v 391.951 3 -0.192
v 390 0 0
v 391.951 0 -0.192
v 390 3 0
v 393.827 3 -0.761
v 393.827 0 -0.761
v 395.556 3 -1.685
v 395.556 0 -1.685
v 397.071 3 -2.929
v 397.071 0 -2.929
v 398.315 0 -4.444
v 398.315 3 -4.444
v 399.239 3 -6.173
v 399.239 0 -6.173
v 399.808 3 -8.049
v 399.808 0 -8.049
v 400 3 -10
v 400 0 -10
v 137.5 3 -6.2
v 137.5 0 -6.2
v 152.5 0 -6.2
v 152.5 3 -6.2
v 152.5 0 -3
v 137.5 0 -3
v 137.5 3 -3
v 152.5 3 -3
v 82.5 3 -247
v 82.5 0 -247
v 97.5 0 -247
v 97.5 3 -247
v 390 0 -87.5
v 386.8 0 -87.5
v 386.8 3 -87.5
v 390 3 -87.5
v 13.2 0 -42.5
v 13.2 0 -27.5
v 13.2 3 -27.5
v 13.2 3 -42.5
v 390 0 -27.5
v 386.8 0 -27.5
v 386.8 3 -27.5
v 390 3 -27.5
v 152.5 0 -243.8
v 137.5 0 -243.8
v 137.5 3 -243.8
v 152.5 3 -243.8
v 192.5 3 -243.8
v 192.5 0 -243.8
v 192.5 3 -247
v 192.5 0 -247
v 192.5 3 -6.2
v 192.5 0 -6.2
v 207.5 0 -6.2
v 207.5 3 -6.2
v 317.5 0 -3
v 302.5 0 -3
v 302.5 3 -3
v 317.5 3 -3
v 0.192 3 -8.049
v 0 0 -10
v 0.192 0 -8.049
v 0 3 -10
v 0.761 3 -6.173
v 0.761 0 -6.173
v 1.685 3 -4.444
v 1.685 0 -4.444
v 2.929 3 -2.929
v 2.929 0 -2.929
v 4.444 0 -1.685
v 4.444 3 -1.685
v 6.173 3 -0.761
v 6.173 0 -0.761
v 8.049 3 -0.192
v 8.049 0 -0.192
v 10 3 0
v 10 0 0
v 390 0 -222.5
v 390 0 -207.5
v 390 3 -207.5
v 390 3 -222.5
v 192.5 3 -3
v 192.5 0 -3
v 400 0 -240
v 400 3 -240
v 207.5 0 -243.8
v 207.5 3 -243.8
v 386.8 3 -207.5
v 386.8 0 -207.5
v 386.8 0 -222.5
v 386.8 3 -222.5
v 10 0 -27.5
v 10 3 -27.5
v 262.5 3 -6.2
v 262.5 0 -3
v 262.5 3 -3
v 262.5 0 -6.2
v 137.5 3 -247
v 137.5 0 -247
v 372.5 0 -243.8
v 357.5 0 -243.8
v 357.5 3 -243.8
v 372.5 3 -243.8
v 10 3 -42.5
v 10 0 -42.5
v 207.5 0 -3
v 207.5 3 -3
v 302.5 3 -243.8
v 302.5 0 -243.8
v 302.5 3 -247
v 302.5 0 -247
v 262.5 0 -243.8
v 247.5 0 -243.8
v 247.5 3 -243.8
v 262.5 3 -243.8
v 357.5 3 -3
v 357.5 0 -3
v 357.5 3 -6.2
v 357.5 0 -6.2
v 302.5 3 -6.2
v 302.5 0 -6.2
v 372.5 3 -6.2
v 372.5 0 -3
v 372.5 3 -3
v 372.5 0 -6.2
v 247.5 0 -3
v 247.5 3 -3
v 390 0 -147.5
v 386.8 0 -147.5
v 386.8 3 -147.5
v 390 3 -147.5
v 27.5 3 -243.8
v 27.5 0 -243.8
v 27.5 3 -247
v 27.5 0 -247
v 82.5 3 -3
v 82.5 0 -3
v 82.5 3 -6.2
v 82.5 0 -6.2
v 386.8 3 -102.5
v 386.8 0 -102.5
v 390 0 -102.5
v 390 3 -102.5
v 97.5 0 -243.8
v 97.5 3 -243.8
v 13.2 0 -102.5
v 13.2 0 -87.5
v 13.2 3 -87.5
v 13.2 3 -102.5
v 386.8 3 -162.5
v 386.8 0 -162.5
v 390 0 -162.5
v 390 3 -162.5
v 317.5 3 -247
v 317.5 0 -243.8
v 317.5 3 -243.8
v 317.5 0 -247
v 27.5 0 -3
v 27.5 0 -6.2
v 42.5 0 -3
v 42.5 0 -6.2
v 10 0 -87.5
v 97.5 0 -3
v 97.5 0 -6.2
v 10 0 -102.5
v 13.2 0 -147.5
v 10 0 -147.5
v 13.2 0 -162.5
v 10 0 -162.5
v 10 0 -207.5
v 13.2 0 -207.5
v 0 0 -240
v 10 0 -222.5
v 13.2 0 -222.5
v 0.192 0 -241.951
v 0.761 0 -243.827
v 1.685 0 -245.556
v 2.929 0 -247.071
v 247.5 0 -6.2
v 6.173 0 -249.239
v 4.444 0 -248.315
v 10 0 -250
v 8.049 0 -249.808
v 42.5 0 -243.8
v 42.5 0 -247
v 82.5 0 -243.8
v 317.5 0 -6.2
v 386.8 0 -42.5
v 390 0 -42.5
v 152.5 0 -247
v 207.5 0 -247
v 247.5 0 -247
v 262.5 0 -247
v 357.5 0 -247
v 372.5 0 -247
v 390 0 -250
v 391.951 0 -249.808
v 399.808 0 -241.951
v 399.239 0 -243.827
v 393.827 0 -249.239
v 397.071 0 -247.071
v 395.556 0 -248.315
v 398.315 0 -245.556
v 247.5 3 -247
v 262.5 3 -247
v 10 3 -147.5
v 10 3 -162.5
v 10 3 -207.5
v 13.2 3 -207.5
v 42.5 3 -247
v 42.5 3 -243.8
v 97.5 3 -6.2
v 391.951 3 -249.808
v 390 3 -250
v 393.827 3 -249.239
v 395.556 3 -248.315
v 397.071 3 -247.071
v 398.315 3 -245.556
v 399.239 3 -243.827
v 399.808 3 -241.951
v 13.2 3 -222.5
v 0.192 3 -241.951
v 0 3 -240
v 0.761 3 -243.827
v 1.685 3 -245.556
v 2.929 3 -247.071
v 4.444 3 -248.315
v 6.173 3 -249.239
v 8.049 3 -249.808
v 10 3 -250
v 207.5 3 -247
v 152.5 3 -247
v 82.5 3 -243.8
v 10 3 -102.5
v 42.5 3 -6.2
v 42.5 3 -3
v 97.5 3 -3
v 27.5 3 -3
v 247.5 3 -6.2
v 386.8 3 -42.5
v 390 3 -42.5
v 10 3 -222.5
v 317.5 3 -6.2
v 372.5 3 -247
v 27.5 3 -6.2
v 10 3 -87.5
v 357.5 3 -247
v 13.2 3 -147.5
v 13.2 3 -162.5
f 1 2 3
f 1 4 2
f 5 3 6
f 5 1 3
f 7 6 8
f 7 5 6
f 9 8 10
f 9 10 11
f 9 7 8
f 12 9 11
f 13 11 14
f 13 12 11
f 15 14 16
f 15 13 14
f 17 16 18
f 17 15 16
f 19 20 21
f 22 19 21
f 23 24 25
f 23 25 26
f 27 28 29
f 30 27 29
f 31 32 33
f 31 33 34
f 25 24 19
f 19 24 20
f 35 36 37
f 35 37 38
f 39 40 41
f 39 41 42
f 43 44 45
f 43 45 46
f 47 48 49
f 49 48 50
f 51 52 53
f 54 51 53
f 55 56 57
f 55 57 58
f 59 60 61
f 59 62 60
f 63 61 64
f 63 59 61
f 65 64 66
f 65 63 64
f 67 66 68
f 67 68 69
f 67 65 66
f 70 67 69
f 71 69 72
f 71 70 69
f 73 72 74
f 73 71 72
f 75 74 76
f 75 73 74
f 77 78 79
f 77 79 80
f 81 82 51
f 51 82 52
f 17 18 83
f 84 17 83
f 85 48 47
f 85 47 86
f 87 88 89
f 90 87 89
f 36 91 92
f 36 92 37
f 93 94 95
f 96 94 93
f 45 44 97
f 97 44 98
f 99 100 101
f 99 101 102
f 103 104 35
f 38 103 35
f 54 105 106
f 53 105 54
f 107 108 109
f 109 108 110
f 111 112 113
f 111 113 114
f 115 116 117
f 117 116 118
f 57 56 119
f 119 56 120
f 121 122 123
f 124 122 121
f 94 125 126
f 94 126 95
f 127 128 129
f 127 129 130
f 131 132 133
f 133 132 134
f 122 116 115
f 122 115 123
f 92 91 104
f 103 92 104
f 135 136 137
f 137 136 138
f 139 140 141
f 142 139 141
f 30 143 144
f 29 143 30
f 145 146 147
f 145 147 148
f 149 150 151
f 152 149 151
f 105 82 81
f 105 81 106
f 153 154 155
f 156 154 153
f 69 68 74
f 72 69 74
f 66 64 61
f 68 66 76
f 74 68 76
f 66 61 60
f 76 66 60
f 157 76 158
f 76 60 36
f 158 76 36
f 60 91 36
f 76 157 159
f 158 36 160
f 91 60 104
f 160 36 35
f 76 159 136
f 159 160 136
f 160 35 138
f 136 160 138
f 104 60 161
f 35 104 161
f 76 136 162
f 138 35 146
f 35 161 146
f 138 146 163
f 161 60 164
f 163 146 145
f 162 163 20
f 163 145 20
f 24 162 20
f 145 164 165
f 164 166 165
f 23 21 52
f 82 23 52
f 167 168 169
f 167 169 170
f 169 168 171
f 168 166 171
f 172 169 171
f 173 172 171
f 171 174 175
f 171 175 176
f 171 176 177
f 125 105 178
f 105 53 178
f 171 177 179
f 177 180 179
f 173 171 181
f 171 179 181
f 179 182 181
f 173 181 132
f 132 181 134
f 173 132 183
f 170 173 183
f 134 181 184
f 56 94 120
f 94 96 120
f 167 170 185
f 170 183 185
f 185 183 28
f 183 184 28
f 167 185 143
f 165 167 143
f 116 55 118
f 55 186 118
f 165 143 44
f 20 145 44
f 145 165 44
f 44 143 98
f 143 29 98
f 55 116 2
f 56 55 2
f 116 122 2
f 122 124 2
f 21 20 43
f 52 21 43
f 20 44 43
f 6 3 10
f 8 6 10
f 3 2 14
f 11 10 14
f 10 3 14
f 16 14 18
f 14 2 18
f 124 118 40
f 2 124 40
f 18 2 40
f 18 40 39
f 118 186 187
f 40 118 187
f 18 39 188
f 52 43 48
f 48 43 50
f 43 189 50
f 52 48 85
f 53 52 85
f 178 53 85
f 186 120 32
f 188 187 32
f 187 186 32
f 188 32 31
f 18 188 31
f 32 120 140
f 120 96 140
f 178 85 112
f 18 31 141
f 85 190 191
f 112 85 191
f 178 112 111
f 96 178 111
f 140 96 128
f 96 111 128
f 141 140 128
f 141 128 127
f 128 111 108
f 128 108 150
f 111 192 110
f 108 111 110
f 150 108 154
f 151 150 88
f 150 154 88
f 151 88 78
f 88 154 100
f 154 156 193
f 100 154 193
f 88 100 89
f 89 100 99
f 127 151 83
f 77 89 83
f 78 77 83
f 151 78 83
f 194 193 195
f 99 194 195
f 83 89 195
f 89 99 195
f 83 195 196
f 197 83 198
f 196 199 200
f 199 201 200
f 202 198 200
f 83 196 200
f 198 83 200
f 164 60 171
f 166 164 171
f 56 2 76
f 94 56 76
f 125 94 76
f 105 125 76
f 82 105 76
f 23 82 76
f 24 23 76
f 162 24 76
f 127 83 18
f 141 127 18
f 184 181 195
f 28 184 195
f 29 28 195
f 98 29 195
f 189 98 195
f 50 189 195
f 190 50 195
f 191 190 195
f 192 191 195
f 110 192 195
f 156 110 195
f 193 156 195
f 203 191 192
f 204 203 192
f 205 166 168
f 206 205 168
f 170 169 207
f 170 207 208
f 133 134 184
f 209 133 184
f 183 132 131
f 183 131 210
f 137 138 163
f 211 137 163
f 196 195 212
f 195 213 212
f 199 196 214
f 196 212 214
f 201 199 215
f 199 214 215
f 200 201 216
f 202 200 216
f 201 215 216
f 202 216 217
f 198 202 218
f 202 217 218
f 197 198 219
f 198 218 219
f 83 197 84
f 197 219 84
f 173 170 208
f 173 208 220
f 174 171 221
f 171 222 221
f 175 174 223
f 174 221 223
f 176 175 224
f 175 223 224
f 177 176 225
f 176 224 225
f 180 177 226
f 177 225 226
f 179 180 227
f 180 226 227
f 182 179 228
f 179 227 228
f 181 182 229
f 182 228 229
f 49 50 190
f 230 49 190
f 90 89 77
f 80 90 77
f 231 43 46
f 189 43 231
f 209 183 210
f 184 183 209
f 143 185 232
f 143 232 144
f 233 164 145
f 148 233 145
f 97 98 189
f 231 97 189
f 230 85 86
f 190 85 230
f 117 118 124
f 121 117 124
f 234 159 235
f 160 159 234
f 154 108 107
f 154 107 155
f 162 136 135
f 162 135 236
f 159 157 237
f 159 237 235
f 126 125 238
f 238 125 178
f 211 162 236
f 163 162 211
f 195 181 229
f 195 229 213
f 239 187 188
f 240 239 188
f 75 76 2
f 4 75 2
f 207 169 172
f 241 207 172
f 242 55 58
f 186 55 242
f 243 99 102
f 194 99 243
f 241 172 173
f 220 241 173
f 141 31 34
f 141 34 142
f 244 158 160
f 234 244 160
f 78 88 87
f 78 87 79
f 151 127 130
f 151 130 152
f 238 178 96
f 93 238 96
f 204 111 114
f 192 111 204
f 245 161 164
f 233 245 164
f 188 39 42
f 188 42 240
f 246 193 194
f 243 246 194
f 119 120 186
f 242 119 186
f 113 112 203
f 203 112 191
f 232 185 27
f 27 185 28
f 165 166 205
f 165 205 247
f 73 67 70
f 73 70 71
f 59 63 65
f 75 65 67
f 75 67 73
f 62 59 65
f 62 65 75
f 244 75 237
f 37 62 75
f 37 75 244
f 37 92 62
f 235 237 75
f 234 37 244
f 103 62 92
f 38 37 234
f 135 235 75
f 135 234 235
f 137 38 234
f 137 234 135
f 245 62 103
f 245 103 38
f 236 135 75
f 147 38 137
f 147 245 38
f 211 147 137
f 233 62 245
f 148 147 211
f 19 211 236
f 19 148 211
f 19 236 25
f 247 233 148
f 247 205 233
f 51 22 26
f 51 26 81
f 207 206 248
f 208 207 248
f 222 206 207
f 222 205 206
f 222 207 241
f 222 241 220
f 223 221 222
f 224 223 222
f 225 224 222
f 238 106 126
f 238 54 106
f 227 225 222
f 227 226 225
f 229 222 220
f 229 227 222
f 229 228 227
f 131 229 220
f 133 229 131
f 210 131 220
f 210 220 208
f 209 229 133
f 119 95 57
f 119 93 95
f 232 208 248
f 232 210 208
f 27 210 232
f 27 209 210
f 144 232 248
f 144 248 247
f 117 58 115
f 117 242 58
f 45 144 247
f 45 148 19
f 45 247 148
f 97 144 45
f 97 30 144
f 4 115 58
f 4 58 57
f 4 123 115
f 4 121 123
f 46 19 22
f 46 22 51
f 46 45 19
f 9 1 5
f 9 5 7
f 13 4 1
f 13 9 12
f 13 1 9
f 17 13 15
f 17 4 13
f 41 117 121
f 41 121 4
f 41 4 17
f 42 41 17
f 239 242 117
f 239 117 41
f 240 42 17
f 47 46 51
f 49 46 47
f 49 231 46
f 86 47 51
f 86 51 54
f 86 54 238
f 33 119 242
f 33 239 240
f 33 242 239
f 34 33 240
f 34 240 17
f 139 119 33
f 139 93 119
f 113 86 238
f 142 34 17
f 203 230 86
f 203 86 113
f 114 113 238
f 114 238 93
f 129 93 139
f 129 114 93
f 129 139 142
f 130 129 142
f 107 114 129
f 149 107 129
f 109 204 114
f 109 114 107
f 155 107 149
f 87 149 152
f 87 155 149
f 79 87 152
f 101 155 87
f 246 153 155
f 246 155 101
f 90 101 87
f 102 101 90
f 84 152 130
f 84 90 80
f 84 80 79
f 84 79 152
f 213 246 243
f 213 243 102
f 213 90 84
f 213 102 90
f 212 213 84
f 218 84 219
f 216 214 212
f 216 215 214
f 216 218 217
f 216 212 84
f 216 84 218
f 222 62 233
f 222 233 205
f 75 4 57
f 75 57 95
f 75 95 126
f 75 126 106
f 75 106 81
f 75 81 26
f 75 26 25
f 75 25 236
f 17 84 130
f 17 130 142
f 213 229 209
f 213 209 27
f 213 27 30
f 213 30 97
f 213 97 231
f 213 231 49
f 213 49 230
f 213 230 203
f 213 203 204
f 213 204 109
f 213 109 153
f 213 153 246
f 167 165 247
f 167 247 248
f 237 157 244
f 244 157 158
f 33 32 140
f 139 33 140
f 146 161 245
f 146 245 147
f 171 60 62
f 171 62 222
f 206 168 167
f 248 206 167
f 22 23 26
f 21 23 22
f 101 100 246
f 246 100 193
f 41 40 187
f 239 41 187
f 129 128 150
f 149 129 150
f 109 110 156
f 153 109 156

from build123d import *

# Parameters (mm, degrees)
SKETCH1_W           = 400
SKETCH1_H           = 250
SKETCH1_W_2         = 15
SKETCH1_H_2         = 3.2
SKETCH1_W_3         = 3.2
SKETCH1_H_3         = 15
BOSS_EXTRUDE2_DEPTH = 3
FILLET1_R           = 10


with BuildPart() as part:
    # Sketch1 → Boss-Extrude2 (new body)
    with BuildSketch(Plane(origin=(0, 0, 0), x_dir=(1, 0, 0), z_dir=(0, 1, 0))):
        with Locations((200, 125)):
            Rectangle(SKETCH1_W, SKETCH1_H)
        with Locations((90, 4.6)):
            Rectangle(SKETCH1_W_2, SKETCH1_H_2, mode=Mode.SUBTRACT)
        with Locations((35, 4.6)):
            Rectangle(SKETCH1_W_2, SKETCH1_H_2, mode=Mode.SUBTRACT)
        with Locations((145, 4.6)):
            Rectangle(SKETCH1_W_2, SKETCH1_H_2, mode=Mode.SUBTRACT)
        with Locations((200, 4.6)):
            Rectangle(SKETCH1_W_2, SKETCH1_H_2, mode=Mode.SUBTRACT)
        with Locations((255, 4.6)):
            Rectangle(SKETCH1_W_2, SKETCH1_H_2, mode=Mode.SUBTRACT)
        with Locations((310, 4.6)):
            Rectangle(SKETCH1_W_2, SKETCH1_H_2, mode=Mode.SUBTRACT)
        with Locations((365, 4.6)):
            Rectangle(SKETCH1_W_2, SKETCH1_H_2, mode=Mode.SUBTRACT)
        with Locations((365, 245.4)):
            Rectangle(SKETCH1_W_2, SKETCH1_H_2, mode=Mode.SUBTRACT)
        with Locations((310, 245.4)):
            Rectangle(SKETCH1_W_2, SKETCH1_H_2, mode=Mode.SUBTRACT)
        with Locations((255, 245.4)):
            Rectangle(SKETCH1_W_2, SKETCH1_H_2, mode=Mode.SUBTRACT)
        with Locations((200, 245.4)):
            Rectangle(SKETCH1_W_2, SKETCH1_H_2, mode=Mode.SUBTRACT)
        with Locations((35, 245.4)):
            Rectangle(SKETCH1_W_2, SKETCH1_H_2, mode=Mode.SUBTRACT)
        with Locations((90, 245.4)):
            Rectangle(SKETCH1_W_2, SKETCH1_H_2, mode=Mode.SUBTRACT)
        with Locations((145, 245.4)):
            Rectangle(SKETCH1_W_2, SKETCH1_H_2, mode=Mode.SUBTRACT)
        with Locations((11.6, 95)):
            Rectangle(SKETCH1_W_3, SKETCH1_H_3, mode=Mode.SUBTRACT)
        with Locations((11.6, 35)):
            Rectangle(SKETCH1_W_3, SKETCH1_H_3, mode=Mode.SUBTRACT)
        with Locations((11.6, 155)):
            Rectangle(SKETCH1_W_3, SKETCH1_H_3, mode=Mode.SUBTRACT)
        with Locations((11.6, 215)):
            Rectangle(SKETCH1_W_3, SKETCH1_H_3, mode=Mode.SUBTRACT)
        with Locations((388.4, 35)):
            Rectangle(SKETCH1_W_3, SKETCH1_H_3, mode=Mode.SUBTRACT)
        with Locations((388.4, 95)):
            Rectangle(SKETCH1_W_3, SKETCH1_H_3, mode=Mode.SUBTRACT)
        with Locations((388.4, 155)):
            Rectangle(SKETCH1_W_3, SKETCH1_H_3, mode=Mode.SUBTRACT)
        with Locations((388.4, 215)):
            Rectangle(SKETCH1_W_3, SKETCH1_H_3, mode=Mode.SUBTRACT)
    extrude(amount=BOSS_EXTRUDE2_DEPTH)

    # Fillet1
    fillet1_edges = [part.edges().sort_by_distance(p)[0] for p in [
        (0, 1.5, -250),
        (400, 1.5, -250),
        (400, 1.5, 0),
        (0, 1.5, 0),
    ]]
    fillet(fillet1_edges, radius=FILLET1_R)


solid = part.part
